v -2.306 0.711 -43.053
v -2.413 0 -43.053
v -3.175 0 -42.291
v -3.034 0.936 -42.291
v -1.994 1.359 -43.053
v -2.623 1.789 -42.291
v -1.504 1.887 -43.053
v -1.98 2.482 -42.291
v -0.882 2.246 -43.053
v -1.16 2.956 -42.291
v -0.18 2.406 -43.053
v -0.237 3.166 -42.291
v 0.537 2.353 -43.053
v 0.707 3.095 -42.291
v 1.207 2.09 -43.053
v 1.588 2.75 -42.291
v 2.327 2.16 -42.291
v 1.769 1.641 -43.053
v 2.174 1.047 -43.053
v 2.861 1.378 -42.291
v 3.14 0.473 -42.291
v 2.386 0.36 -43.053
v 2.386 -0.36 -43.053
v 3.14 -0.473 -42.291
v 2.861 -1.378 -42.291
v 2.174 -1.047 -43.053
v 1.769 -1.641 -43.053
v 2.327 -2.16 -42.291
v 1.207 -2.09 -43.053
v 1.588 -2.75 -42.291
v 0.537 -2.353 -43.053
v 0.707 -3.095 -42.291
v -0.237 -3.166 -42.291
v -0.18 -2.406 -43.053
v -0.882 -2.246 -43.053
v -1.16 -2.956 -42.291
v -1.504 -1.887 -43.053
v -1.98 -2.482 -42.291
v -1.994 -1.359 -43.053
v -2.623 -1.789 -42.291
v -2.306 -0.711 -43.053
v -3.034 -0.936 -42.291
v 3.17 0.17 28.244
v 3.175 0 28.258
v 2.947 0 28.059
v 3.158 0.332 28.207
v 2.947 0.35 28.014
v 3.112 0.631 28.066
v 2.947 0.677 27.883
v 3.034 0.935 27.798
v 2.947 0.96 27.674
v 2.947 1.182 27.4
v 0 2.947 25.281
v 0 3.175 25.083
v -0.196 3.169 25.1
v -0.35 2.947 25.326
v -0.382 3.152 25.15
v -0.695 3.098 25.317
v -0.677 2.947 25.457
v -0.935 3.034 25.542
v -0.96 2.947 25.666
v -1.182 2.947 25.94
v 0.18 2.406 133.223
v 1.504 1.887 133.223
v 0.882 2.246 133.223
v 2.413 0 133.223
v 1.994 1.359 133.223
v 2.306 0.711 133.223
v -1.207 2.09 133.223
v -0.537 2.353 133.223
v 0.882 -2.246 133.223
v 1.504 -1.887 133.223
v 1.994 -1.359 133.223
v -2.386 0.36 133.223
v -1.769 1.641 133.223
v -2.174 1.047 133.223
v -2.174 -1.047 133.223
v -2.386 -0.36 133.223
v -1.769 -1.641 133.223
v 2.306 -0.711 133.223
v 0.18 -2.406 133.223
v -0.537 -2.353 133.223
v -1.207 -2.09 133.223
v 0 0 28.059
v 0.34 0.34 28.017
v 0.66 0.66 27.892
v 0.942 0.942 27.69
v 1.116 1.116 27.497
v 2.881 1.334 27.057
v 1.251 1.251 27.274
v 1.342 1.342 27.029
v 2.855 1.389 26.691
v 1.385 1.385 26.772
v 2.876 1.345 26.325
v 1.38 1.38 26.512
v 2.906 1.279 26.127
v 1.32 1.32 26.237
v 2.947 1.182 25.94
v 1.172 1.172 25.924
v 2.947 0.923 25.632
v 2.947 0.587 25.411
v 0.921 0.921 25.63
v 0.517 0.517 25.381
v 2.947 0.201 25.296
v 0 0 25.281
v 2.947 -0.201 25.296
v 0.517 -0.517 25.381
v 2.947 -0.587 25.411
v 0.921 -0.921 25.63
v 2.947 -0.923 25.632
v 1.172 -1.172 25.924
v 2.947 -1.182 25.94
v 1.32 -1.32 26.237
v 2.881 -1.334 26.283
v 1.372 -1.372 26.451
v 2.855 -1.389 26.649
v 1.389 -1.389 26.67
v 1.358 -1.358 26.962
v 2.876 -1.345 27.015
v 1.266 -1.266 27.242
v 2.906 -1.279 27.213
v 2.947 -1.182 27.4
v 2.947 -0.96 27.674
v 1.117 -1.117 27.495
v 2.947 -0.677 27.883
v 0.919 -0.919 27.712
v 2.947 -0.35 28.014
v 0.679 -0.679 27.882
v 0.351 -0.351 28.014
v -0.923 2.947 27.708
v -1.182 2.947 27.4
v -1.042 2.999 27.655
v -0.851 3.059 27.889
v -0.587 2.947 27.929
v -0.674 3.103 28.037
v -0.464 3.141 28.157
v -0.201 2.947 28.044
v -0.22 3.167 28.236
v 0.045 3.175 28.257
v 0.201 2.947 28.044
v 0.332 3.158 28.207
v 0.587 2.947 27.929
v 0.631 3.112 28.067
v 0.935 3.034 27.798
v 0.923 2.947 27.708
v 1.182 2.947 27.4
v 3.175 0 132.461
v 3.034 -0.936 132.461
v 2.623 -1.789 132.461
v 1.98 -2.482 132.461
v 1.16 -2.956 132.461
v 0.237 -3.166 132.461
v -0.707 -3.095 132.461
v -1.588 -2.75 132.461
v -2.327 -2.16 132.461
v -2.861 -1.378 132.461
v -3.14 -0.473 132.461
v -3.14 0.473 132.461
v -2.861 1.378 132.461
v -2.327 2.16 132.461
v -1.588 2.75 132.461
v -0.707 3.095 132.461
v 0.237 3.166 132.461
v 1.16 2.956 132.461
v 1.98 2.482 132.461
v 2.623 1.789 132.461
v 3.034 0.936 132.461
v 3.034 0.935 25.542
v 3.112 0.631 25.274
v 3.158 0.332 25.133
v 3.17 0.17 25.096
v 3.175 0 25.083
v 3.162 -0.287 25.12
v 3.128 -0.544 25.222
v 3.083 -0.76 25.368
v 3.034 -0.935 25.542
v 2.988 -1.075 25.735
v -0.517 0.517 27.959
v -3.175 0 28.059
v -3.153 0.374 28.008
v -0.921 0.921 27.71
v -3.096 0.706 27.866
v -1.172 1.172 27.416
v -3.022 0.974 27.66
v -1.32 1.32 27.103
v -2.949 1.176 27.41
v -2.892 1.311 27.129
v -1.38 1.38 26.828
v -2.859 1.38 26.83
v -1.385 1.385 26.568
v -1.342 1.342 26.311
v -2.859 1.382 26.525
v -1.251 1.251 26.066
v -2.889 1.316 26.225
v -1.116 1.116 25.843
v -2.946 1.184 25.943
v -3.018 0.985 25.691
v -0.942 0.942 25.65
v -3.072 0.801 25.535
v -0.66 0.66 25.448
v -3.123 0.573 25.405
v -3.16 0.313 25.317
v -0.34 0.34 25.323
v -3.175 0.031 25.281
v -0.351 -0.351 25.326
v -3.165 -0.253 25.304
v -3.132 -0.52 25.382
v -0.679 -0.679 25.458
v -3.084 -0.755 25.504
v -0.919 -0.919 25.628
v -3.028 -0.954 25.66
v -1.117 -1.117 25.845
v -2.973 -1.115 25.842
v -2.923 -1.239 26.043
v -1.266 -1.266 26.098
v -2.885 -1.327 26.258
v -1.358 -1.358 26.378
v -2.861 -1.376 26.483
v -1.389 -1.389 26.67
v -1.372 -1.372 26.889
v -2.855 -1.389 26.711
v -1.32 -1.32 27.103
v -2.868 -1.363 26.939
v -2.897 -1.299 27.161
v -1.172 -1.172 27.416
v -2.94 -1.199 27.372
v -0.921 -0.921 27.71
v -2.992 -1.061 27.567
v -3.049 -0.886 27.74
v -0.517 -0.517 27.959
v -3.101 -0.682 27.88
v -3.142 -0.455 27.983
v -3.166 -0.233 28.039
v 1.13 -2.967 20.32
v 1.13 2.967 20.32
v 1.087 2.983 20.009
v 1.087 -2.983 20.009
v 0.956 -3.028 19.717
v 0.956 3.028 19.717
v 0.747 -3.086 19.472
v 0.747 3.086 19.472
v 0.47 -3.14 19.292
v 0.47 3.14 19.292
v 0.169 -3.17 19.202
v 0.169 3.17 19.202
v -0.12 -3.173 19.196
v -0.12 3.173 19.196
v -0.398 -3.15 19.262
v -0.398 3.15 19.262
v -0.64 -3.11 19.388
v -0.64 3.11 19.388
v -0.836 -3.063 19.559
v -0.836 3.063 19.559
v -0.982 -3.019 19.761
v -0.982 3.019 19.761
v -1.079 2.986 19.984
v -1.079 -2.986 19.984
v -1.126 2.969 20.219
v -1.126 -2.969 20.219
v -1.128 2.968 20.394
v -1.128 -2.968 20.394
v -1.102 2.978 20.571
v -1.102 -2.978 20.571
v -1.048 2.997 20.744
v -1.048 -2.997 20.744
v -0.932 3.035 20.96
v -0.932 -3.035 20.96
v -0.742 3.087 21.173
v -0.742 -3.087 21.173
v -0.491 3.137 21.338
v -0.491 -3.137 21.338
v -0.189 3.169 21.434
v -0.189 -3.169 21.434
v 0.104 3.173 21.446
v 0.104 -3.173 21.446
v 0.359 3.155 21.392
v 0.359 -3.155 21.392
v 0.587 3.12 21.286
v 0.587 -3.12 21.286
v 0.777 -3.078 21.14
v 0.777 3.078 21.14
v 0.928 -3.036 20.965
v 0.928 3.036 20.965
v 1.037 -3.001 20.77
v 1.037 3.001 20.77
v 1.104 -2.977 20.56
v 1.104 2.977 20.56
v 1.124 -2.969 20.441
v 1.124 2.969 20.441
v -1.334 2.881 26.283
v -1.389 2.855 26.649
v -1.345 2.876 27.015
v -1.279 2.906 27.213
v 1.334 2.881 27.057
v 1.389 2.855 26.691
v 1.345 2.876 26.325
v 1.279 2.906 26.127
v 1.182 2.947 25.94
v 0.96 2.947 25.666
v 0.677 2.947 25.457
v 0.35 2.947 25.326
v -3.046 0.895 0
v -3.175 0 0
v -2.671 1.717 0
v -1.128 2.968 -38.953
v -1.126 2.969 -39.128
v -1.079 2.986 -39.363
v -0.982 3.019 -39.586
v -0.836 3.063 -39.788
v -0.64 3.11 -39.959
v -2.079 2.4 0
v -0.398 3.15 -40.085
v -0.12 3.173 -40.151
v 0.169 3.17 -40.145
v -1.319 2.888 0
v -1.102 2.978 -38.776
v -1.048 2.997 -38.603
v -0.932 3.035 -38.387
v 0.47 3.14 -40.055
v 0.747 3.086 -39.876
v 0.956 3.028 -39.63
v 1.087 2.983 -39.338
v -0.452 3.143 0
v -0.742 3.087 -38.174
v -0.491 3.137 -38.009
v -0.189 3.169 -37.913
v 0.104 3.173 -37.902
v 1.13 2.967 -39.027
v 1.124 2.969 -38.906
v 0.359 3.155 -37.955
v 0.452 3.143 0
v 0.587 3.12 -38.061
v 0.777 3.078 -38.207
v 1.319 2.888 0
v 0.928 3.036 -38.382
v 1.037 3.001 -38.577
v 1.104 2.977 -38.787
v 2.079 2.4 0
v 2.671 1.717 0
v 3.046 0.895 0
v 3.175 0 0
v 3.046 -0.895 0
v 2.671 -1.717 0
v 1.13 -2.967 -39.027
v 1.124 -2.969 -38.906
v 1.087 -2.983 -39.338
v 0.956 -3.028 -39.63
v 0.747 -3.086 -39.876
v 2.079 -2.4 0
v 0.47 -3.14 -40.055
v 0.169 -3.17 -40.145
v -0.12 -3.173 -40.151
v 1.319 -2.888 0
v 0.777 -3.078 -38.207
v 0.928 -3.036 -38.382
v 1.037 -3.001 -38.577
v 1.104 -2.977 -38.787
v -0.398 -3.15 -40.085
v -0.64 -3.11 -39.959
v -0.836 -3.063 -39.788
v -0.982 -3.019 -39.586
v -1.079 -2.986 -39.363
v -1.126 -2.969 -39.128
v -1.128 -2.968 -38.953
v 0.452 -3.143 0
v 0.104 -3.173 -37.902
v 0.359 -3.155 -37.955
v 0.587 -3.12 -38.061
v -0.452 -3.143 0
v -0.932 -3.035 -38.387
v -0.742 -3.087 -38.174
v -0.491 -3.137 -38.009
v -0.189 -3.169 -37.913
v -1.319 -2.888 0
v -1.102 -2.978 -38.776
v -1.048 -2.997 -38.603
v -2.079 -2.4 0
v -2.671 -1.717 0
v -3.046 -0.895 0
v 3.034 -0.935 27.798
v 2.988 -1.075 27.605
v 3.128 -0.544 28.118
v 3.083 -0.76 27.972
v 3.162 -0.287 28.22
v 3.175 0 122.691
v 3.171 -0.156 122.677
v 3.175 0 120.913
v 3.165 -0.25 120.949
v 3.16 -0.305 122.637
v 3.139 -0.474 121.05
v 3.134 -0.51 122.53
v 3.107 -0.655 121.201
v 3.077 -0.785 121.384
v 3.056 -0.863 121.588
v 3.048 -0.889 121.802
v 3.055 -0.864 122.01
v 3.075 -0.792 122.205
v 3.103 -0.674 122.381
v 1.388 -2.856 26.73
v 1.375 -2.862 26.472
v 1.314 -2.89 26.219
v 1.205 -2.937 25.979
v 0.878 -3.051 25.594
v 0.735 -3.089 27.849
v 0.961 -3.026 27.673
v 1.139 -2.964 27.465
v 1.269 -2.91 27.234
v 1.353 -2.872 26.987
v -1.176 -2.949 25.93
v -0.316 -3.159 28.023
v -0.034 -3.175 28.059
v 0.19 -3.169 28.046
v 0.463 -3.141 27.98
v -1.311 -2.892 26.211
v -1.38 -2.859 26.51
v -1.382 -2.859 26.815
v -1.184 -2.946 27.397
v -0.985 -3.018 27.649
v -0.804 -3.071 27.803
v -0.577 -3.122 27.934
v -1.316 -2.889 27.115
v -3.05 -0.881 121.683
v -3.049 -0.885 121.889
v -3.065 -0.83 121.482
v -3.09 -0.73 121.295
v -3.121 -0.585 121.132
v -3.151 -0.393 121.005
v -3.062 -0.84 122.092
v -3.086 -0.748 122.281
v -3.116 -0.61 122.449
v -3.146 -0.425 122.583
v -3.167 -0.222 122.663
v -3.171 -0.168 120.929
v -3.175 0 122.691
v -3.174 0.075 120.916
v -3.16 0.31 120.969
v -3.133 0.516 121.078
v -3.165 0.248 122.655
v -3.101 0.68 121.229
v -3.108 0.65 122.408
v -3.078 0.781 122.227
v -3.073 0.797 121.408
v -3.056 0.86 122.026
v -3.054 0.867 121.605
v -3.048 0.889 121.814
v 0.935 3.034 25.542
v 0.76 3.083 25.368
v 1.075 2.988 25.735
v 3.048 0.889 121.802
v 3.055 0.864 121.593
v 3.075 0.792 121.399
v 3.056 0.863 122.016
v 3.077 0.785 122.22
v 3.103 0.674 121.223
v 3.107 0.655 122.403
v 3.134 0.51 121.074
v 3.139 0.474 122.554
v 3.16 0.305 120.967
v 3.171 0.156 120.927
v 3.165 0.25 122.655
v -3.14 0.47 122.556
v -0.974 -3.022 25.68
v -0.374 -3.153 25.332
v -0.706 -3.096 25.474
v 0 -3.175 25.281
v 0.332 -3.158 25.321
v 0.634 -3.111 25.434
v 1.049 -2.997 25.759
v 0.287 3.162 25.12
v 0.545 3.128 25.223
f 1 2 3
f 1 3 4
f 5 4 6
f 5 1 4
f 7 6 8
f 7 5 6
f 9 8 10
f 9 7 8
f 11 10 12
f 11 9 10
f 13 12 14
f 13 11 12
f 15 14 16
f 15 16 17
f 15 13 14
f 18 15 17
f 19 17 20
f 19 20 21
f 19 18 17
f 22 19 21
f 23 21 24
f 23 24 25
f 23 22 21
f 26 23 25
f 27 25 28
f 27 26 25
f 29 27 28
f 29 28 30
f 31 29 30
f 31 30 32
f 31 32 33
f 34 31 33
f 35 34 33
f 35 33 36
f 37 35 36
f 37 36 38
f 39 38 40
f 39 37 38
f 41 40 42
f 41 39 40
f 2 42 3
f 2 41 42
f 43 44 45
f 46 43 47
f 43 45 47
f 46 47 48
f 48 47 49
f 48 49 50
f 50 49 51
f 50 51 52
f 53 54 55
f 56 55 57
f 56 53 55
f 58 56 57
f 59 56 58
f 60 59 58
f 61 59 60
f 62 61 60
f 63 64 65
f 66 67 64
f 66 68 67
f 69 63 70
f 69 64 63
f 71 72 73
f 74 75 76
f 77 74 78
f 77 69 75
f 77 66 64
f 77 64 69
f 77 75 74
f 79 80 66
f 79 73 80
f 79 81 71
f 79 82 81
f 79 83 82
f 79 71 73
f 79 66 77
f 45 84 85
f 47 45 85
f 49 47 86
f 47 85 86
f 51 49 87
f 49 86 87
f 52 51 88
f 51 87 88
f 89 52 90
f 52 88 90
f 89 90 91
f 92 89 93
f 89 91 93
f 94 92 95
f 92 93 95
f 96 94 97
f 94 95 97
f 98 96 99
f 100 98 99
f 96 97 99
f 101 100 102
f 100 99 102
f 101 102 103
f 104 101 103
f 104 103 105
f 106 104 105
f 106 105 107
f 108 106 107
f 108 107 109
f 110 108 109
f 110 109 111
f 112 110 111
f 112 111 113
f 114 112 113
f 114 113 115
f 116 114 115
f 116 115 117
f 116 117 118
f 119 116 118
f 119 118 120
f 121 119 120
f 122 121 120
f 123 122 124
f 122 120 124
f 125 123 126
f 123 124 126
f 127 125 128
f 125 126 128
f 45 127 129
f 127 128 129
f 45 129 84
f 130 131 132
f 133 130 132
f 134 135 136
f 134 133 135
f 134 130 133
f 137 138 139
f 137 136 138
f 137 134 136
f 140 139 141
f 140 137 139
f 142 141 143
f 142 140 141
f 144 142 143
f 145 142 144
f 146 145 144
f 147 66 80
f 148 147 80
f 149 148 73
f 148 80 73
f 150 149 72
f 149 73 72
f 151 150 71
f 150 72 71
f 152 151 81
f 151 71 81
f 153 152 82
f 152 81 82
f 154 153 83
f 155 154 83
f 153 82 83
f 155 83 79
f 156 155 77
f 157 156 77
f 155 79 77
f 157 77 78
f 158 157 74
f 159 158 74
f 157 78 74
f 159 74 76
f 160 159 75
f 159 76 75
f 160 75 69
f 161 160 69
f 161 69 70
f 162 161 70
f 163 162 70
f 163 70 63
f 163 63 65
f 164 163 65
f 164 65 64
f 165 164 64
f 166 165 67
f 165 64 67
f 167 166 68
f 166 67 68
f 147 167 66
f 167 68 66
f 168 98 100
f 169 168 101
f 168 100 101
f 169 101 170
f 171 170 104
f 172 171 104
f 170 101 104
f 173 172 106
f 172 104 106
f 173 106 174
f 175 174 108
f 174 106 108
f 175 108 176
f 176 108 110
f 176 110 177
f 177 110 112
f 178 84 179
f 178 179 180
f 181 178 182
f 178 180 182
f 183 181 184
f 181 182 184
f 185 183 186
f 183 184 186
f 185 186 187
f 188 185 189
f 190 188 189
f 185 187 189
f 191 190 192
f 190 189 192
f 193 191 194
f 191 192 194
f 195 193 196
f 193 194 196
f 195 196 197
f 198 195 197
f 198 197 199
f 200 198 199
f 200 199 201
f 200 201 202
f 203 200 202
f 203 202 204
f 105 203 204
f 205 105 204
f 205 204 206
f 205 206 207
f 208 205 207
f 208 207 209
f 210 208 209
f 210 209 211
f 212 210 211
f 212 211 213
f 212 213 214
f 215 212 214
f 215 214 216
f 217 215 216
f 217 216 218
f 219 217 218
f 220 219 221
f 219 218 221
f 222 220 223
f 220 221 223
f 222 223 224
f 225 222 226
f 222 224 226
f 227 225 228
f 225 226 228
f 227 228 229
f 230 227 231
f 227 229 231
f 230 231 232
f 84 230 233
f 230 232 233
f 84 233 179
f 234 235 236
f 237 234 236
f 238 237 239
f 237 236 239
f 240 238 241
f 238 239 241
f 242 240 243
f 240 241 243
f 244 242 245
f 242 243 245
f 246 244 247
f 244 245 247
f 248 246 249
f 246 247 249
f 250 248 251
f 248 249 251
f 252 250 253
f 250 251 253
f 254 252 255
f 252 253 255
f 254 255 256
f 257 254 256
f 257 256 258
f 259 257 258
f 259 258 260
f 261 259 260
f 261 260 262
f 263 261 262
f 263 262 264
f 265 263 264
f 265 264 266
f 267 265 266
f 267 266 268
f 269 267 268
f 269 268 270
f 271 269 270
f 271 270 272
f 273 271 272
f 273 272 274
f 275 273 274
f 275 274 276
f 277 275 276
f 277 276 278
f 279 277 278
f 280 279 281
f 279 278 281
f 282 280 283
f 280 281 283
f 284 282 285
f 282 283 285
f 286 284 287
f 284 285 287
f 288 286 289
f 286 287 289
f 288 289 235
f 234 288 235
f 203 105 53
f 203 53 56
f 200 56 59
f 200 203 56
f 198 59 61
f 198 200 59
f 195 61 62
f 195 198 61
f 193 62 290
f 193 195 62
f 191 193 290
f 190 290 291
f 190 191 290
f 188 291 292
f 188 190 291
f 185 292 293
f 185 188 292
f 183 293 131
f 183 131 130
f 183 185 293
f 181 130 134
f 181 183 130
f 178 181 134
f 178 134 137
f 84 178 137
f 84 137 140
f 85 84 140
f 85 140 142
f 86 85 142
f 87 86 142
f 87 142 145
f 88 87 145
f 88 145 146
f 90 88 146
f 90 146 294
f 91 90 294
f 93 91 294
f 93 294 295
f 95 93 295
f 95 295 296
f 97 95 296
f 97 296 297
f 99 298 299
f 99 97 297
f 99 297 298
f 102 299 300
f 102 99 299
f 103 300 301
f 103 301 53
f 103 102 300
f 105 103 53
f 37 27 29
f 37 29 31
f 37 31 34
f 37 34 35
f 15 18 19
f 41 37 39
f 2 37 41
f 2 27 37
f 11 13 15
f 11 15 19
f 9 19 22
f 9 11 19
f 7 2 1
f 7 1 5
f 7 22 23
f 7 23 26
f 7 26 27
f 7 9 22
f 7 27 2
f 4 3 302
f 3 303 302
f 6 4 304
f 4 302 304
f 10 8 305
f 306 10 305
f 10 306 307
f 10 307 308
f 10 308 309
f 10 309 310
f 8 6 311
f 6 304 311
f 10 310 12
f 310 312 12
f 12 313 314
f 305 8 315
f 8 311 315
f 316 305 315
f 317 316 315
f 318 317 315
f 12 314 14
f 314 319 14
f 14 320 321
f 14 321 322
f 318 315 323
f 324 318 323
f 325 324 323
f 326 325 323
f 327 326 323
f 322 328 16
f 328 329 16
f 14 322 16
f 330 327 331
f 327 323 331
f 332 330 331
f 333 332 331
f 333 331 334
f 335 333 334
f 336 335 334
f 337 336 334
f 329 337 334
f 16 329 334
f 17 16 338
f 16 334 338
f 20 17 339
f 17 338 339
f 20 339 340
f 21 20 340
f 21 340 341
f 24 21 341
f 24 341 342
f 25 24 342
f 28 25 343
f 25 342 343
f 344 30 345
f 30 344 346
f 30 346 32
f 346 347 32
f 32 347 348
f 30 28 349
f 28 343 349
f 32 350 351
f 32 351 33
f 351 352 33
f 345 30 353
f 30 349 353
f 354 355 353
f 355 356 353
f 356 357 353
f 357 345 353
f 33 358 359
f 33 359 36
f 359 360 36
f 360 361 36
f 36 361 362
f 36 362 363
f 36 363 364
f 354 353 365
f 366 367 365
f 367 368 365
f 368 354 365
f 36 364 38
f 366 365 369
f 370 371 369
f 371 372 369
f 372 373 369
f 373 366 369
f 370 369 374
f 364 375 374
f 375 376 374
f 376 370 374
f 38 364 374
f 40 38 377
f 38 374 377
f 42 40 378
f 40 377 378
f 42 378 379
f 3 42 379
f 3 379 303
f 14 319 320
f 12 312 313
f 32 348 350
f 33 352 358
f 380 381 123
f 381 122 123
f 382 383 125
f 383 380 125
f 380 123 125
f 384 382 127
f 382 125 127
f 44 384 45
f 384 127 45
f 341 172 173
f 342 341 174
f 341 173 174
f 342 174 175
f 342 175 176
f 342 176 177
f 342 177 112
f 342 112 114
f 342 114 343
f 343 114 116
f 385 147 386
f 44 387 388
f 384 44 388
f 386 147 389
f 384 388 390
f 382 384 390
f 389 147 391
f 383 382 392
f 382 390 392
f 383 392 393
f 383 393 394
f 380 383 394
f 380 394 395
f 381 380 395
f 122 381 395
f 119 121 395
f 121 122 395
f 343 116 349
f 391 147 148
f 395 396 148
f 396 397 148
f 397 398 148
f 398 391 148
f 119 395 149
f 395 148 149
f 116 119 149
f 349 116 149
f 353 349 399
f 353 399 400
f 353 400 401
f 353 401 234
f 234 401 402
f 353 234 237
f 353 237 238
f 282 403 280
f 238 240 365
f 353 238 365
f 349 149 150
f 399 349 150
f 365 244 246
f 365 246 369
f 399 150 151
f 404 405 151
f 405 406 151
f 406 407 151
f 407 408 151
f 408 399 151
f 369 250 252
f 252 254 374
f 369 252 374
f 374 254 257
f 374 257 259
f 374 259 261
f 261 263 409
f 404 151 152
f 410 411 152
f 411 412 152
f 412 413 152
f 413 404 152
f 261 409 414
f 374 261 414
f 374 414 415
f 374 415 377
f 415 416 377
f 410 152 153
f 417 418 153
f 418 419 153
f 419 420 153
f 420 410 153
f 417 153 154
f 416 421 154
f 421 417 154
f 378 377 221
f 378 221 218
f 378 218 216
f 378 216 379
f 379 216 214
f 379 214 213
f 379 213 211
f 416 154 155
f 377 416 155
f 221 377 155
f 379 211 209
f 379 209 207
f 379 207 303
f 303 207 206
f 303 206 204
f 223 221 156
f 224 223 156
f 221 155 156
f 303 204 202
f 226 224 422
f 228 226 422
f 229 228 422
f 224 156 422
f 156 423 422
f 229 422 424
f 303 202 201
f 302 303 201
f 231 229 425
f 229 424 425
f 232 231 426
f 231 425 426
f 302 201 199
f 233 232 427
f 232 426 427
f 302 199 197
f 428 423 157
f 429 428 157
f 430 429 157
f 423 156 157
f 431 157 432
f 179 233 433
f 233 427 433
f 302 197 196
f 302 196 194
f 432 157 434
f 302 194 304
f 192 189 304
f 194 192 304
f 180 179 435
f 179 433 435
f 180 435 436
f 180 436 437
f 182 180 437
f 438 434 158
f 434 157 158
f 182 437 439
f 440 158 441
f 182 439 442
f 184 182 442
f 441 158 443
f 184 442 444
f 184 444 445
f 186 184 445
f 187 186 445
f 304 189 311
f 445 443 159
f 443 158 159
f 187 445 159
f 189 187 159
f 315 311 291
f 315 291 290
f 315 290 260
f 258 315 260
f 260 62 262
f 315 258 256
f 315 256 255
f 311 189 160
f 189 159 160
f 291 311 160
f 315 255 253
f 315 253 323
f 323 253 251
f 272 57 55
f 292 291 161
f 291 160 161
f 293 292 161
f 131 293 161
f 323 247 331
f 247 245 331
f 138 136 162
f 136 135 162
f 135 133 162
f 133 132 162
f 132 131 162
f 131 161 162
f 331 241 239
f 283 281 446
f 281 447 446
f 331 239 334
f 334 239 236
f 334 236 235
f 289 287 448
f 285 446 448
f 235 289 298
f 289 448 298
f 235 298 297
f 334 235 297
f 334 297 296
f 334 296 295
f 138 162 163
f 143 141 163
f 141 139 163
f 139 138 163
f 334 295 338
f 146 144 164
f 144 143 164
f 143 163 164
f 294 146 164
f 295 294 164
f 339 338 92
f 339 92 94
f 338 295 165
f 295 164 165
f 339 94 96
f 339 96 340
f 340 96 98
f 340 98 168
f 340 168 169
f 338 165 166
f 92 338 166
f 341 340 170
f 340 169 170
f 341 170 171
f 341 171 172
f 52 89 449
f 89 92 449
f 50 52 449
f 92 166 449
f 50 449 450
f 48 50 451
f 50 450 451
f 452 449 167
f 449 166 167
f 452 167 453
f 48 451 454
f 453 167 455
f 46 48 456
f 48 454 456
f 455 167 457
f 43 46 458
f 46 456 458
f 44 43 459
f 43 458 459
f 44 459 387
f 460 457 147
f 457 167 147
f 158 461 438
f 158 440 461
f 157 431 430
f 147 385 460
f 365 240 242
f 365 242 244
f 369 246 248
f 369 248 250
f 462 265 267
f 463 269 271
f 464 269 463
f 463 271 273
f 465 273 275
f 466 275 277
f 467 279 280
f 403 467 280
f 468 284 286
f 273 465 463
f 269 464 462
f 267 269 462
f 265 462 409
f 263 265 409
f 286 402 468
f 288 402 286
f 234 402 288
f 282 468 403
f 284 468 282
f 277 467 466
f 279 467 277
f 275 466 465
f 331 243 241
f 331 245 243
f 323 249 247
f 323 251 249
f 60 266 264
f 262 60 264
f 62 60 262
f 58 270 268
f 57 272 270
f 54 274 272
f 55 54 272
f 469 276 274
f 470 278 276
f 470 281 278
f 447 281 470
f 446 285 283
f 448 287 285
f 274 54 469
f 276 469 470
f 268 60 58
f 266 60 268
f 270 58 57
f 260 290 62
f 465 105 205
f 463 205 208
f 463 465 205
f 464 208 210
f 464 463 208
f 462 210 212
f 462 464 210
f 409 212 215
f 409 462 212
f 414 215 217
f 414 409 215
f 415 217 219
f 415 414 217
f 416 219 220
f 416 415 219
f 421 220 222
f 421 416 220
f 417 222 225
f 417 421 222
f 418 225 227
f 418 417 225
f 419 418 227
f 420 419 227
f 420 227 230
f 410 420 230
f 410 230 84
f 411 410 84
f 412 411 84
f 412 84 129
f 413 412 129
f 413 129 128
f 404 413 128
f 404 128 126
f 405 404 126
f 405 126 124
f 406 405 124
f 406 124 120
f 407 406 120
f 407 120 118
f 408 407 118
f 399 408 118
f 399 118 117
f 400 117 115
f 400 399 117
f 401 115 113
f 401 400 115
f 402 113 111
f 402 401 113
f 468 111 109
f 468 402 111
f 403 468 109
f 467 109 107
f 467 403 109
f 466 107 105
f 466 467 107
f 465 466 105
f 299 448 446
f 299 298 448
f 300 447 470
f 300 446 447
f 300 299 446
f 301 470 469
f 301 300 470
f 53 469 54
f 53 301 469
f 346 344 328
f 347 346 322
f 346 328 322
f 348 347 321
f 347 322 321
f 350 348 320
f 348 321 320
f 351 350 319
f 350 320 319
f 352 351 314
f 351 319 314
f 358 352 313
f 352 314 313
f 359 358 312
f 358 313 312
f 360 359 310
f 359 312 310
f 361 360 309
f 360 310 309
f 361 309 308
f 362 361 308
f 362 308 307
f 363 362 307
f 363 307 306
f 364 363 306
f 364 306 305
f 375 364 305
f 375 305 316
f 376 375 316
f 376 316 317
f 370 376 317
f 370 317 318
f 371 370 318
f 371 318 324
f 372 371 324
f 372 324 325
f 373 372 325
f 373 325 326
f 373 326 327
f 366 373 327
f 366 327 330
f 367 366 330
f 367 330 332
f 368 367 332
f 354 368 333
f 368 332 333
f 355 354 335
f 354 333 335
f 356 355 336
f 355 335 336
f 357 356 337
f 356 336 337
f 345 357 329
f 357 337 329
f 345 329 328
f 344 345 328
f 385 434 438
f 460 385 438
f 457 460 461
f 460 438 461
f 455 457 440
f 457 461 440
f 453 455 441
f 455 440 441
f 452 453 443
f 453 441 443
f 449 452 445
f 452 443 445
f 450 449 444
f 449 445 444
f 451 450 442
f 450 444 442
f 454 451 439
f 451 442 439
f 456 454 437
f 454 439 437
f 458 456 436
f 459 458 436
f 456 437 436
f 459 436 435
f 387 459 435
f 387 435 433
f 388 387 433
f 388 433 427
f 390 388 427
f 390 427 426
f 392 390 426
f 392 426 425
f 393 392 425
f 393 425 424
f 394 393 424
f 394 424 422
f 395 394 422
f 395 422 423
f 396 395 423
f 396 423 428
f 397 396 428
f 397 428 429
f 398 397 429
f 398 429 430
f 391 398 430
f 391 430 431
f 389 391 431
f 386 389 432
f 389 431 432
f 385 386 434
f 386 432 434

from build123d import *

# Parameters (mm, degrees)
SKETCH1_W                                 = 3.175
SKETCH1_H                                 = 133.223
F_2_56_TAPPED_HOLE1_D                     = 1.778
SKETCH4_R                                 = 3.175
BOSS_EXTRUDE1_DEPTH                       = 43.053
CHAMFER1_SIZE                             = 0.762
F_4_40_TAPPED_HOLE2_D                     = 2.2606
F_7_64_0_10938_DIAMETER_HOLE2_D           = 2.778252
F_7_64_0_10938_DIAMETER_HOLE2_CSINK_D     = 3.175
F_7_64_0_10938_DIAMETER_HOLE2_CSINK_ANGLE = 82


with BuildPart() as part:
    # Sketch1 → Revolve1 (revolve)
    with BuildSketch(Plane.XZ):
        with Locations((1.5875, 66.6115)):
            Rectangle(SKETCH1_W, SKETCH1_H)
    revolve(axis=Axis((0, 0, 133.223), (0, 0, -1)))

    # #2-56 Tapped Hole1 (through all)
    with Locations(Plane(origin=(3.175, 0, 0), x_dir=(0, 0, -1), z_dir=(1, 0, 0))):
        with Locations((-121.801801862, 0)):
            Hole(F_2_56_TAPPED_HOLE1_D / 2)

    # Sketch4 → Boss-Extrude1 (add)
    with BuildSketch(Plane(origin=(0, 0, 0), x_dir=(-1, 0, 0), z_dir=(0, 0, -1))):
        Circle(SKETCH4_R)
    extrude(amount=BOSS_EXTRUDE1_DEPTH)

    # Chamfer1
    chamfer1_edges = [part.edges().sort_by_distance(p)[0] for p in [
        (3.175, 0, -43.053),
        (-3.175, 0, 133.223),
    ]]
    chamfer(chamfer1_edges, length=CHAMFER1_SIZE)

    # #4-40 Tapped Hole2 (through all)
    with Locations(Plane(origin=(0, -3.175, 0), x_dir=(-1, 0, 0), z_dir=(0, -1, 0))):
        with Locations((0, -20.32), (0, 39.0271)):
            Hole(F_4_40_TAPPED_HOLE2_D / 2)

    # Sketch10 → 7/64 (0.10938) Diameter Hole1 (revolve, cut)
    with BuildSketch(Plane(origin=(0, -3.175, 26.67), x_dir=(0, 0, -1), z_dir=(1, 0, 0))):
        Polygon((0, 0), (0, 6.35), (1.5875, 6.35), (1.389126, 6.121796818), (1.389126, 0), align=None)
    revolve(axis=Axis((0, -9.525, 26.67), (0, 1, 0)), mode=Mode.SUBTRACT)

    # 7/64 (0.10938) Diameter Hole2 (through all)
    with Locations(Plane(origin=(3.175, 0, 0), x_dir=(0, 0, -1), z_dir=(1, 0, 0))):
        with Locations((-26.67, 0)):
            CounterSinkHole(F_7_64_0_10938_DIAMETER_HOLE2_D / 2, F_7_64_0_10938_DIAMETER_HOLE2_CSINK_D / 2, counter_sink_angle=F_7_64_0_10938_DIAMETER_HOLE2_CSINK_ANGLE)


solid = part.part
